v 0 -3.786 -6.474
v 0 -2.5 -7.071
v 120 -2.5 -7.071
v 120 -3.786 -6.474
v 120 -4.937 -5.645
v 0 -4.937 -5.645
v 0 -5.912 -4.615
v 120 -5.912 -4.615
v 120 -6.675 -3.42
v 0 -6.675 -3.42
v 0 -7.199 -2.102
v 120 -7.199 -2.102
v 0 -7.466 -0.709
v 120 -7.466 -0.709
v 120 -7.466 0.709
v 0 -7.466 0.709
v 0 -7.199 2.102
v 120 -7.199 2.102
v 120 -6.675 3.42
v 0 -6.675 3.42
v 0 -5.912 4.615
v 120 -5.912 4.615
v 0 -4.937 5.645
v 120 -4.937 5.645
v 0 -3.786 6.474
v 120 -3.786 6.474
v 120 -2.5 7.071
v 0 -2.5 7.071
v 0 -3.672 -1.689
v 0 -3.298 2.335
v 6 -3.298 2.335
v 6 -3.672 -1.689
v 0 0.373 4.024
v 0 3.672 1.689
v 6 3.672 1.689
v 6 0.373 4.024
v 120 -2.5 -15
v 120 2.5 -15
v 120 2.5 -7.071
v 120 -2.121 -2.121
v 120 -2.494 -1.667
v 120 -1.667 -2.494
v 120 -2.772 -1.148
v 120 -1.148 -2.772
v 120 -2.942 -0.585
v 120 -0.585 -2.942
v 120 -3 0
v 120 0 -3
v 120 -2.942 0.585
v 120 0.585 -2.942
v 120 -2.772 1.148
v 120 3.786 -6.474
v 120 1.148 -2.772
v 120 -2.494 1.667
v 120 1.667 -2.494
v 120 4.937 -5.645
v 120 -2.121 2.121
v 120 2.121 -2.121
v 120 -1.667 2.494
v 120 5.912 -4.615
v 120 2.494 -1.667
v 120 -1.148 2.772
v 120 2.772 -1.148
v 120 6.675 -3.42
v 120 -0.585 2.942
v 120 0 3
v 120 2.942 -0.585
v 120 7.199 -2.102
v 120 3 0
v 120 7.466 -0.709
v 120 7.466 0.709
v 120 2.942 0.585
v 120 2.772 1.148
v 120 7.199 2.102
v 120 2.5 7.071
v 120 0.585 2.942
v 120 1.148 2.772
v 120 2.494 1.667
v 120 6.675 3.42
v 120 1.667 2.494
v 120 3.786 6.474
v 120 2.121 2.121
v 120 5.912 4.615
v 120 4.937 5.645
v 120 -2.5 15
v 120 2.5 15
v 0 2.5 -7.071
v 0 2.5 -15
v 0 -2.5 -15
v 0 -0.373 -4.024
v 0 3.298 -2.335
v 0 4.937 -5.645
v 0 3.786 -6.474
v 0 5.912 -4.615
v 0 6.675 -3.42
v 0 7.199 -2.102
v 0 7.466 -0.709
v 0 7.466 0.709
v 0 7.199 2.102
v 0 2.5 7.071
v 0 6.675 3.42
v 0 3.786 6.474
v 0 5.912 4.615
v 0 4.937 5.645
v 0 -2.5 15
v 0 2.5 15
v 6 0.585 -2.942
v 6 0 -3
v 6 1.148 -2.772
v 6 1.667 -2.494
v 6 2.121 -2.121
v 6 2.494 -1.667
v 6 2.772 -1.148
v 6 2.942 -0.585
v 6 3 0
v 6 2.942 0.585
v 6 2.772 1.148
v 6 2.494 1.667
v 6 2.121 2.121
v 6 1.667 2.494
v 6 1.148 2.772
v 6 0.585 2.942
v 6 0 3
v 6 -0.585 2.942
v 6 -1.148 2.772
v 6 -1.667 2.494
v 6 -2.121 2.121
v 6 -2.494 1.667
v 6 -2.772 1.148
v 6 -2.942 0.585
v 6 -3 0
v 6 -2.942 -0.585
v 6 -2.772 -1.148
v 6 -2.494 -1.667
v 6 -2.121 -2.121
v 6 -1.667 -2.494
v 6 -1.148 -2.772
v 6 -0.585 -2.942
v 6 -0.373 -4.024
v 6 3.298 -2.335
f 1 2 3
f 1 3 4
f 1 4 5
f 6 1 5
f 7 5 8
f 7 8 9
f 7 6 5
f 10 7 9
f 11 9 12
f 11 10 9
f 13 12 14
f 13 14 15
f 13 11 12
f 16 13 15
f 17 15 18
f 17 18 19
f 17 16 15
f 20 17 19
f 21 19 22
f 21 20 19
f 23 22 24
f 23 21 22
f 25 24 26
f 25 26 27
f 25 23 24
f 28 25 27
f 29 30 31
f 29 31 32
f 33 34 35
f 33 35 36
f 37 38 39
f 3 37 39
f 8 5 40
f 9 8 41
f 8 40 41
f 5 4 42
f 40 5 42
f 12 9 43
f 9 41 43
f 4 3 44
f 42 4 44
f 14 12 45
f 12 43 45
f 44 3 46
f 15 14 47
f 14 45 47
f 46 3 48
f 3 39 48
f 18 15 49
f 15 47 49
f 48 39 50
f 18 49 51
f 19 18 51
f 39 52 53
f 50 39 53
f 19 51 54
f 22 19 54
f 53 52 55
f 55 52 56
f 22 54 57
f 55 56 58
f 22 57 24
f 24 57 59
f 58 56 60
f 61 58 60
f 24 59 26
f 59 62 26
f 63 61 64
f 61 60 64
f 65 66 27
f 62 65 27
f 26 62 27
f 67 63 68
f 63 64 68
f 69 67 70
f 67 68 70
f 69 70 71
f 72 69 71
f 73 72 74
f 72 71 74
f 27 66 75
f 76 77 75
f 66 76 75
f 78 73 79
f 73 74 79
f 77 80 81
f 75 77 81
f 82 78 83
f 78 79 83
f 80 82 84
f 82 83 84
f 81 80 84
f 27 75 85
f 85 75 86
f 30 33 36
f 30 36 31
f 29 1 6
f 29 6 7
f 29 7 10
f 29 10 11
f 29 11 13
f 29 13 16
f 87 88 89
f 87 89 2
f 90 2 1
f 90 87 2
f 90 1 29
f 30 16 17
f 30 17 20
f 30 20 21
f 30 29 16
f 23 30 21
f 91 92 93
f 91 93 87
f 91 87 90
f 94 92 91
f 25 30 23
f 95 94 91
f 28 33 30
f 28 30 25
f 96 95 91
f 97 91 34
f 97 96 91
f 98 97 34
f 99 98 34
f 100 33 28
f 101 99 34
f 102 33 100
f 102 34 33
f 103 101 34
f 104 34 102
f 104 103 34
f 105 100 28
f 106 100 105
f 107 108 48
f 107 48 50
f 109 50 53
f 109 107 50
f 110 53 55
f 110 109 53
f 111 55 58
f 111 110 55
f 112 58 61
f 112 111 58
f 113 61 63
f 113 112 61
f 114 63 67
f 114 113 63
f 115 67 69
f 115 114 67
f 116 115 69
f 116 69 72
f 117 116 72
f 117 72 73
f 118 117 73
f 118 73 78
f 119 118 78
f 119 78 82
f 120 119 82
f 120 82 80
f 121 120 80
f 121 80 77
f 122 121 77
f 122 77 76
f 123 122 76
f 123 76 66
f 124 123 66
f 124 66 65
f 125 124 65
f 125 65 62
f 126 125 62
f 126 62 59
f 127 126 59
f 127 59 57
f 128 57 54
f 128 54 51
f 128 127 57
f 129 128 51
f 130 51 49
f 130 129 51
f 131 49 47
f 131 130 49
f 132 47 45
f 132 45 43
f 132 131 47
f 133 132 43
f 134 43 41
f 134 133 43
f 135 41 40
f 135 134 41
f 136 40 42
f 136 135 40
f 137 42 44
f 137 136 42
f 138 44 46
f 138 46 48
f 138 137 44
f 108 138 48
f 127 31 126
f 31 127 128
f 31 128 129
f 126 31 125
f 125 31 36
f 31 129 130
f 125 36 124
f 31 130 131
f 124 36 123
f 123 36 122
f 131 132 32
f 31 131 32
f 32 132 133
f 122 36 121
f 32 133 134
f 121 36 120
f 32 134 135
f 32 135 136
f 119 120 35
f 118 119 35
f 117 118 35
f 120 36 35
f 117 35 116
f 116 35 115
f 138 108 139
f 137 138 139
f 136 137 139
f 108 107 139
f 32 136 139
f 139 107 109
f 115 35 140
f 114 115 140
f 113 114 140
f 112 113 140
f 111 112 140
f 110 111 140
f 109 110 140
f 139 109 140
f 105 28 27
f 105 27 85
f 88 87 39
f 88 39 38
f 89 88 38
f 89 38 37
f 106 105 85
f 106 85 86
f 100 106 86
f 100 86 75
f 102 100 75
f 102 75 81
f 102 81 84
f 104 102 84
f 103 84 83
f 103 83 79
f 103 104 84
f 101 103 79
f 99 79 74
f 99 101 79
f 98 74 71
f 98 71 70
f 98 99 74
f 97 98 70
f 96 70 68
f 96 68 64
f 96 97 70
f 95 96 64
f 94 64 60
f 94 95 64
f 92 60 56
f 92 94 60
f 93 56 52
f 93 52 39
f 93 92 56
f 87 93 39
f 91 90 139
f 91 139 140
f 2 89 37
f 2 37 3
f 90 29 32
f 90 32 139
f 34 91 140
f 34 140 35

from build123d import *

# Parameters (mm, degrees)
SKETCH_1_R          = 3
EXTRUDE_1_DEPTH     = 120
CUT_EXTRUDE_1_DEPTH = 6


with BuildPart() as part:
    # Эскиз1 → Бобышка-Вытянуть1 (new body)
    with BuildSketch(Plane(origin=(0, 0, 0), x_dir=(0, 0, -1), z_dir=(1, 0, 0))):
        with BuildLine():
            Line((-15, 2.5), (-7.071067812, 2.5))
            ThreePointArc((-7.071067812, 2.5), (0, 7.5), (7.071067812, 2.5))
            Line((7.071067812, 2.5), (15, 2.5))
            Line((15, 2.5), (15, -2.5))
            Line((15, -2.5), (7.071067812, -2.5))
            ThreePointArc((7.071067812, -2.5), (0, -7.5), (-7.071067812, -2.5))
            Line((-7.071067812, -2.5), (-15, -2.5))
            Line((-15, -2.5), (-15, 2.5))
        make_face()
        Circle(SKETCH_1_R, mode=Mode.SUBTRACT)
    extrude(amount=EXTRUDE_1_DEPTH)

    # Эскиз2 → Вырез-Вытянуть1 (cut)
    with BuildSketch(Plane.ZY):
        Polygon((1.688931143, 3.671627014), (4.024187839, 0.373156232), (2.335256696, -3.298470782), (-1.688931143, -3.671627014), (-4.024187839, -0.373156232), (-2.335256696, 3.298470782), align=None)
    extrude(amount=-CUT_EXTRUDE_1_DEPTH, mode=Mode.SUBTRACT)


solid = part.part
